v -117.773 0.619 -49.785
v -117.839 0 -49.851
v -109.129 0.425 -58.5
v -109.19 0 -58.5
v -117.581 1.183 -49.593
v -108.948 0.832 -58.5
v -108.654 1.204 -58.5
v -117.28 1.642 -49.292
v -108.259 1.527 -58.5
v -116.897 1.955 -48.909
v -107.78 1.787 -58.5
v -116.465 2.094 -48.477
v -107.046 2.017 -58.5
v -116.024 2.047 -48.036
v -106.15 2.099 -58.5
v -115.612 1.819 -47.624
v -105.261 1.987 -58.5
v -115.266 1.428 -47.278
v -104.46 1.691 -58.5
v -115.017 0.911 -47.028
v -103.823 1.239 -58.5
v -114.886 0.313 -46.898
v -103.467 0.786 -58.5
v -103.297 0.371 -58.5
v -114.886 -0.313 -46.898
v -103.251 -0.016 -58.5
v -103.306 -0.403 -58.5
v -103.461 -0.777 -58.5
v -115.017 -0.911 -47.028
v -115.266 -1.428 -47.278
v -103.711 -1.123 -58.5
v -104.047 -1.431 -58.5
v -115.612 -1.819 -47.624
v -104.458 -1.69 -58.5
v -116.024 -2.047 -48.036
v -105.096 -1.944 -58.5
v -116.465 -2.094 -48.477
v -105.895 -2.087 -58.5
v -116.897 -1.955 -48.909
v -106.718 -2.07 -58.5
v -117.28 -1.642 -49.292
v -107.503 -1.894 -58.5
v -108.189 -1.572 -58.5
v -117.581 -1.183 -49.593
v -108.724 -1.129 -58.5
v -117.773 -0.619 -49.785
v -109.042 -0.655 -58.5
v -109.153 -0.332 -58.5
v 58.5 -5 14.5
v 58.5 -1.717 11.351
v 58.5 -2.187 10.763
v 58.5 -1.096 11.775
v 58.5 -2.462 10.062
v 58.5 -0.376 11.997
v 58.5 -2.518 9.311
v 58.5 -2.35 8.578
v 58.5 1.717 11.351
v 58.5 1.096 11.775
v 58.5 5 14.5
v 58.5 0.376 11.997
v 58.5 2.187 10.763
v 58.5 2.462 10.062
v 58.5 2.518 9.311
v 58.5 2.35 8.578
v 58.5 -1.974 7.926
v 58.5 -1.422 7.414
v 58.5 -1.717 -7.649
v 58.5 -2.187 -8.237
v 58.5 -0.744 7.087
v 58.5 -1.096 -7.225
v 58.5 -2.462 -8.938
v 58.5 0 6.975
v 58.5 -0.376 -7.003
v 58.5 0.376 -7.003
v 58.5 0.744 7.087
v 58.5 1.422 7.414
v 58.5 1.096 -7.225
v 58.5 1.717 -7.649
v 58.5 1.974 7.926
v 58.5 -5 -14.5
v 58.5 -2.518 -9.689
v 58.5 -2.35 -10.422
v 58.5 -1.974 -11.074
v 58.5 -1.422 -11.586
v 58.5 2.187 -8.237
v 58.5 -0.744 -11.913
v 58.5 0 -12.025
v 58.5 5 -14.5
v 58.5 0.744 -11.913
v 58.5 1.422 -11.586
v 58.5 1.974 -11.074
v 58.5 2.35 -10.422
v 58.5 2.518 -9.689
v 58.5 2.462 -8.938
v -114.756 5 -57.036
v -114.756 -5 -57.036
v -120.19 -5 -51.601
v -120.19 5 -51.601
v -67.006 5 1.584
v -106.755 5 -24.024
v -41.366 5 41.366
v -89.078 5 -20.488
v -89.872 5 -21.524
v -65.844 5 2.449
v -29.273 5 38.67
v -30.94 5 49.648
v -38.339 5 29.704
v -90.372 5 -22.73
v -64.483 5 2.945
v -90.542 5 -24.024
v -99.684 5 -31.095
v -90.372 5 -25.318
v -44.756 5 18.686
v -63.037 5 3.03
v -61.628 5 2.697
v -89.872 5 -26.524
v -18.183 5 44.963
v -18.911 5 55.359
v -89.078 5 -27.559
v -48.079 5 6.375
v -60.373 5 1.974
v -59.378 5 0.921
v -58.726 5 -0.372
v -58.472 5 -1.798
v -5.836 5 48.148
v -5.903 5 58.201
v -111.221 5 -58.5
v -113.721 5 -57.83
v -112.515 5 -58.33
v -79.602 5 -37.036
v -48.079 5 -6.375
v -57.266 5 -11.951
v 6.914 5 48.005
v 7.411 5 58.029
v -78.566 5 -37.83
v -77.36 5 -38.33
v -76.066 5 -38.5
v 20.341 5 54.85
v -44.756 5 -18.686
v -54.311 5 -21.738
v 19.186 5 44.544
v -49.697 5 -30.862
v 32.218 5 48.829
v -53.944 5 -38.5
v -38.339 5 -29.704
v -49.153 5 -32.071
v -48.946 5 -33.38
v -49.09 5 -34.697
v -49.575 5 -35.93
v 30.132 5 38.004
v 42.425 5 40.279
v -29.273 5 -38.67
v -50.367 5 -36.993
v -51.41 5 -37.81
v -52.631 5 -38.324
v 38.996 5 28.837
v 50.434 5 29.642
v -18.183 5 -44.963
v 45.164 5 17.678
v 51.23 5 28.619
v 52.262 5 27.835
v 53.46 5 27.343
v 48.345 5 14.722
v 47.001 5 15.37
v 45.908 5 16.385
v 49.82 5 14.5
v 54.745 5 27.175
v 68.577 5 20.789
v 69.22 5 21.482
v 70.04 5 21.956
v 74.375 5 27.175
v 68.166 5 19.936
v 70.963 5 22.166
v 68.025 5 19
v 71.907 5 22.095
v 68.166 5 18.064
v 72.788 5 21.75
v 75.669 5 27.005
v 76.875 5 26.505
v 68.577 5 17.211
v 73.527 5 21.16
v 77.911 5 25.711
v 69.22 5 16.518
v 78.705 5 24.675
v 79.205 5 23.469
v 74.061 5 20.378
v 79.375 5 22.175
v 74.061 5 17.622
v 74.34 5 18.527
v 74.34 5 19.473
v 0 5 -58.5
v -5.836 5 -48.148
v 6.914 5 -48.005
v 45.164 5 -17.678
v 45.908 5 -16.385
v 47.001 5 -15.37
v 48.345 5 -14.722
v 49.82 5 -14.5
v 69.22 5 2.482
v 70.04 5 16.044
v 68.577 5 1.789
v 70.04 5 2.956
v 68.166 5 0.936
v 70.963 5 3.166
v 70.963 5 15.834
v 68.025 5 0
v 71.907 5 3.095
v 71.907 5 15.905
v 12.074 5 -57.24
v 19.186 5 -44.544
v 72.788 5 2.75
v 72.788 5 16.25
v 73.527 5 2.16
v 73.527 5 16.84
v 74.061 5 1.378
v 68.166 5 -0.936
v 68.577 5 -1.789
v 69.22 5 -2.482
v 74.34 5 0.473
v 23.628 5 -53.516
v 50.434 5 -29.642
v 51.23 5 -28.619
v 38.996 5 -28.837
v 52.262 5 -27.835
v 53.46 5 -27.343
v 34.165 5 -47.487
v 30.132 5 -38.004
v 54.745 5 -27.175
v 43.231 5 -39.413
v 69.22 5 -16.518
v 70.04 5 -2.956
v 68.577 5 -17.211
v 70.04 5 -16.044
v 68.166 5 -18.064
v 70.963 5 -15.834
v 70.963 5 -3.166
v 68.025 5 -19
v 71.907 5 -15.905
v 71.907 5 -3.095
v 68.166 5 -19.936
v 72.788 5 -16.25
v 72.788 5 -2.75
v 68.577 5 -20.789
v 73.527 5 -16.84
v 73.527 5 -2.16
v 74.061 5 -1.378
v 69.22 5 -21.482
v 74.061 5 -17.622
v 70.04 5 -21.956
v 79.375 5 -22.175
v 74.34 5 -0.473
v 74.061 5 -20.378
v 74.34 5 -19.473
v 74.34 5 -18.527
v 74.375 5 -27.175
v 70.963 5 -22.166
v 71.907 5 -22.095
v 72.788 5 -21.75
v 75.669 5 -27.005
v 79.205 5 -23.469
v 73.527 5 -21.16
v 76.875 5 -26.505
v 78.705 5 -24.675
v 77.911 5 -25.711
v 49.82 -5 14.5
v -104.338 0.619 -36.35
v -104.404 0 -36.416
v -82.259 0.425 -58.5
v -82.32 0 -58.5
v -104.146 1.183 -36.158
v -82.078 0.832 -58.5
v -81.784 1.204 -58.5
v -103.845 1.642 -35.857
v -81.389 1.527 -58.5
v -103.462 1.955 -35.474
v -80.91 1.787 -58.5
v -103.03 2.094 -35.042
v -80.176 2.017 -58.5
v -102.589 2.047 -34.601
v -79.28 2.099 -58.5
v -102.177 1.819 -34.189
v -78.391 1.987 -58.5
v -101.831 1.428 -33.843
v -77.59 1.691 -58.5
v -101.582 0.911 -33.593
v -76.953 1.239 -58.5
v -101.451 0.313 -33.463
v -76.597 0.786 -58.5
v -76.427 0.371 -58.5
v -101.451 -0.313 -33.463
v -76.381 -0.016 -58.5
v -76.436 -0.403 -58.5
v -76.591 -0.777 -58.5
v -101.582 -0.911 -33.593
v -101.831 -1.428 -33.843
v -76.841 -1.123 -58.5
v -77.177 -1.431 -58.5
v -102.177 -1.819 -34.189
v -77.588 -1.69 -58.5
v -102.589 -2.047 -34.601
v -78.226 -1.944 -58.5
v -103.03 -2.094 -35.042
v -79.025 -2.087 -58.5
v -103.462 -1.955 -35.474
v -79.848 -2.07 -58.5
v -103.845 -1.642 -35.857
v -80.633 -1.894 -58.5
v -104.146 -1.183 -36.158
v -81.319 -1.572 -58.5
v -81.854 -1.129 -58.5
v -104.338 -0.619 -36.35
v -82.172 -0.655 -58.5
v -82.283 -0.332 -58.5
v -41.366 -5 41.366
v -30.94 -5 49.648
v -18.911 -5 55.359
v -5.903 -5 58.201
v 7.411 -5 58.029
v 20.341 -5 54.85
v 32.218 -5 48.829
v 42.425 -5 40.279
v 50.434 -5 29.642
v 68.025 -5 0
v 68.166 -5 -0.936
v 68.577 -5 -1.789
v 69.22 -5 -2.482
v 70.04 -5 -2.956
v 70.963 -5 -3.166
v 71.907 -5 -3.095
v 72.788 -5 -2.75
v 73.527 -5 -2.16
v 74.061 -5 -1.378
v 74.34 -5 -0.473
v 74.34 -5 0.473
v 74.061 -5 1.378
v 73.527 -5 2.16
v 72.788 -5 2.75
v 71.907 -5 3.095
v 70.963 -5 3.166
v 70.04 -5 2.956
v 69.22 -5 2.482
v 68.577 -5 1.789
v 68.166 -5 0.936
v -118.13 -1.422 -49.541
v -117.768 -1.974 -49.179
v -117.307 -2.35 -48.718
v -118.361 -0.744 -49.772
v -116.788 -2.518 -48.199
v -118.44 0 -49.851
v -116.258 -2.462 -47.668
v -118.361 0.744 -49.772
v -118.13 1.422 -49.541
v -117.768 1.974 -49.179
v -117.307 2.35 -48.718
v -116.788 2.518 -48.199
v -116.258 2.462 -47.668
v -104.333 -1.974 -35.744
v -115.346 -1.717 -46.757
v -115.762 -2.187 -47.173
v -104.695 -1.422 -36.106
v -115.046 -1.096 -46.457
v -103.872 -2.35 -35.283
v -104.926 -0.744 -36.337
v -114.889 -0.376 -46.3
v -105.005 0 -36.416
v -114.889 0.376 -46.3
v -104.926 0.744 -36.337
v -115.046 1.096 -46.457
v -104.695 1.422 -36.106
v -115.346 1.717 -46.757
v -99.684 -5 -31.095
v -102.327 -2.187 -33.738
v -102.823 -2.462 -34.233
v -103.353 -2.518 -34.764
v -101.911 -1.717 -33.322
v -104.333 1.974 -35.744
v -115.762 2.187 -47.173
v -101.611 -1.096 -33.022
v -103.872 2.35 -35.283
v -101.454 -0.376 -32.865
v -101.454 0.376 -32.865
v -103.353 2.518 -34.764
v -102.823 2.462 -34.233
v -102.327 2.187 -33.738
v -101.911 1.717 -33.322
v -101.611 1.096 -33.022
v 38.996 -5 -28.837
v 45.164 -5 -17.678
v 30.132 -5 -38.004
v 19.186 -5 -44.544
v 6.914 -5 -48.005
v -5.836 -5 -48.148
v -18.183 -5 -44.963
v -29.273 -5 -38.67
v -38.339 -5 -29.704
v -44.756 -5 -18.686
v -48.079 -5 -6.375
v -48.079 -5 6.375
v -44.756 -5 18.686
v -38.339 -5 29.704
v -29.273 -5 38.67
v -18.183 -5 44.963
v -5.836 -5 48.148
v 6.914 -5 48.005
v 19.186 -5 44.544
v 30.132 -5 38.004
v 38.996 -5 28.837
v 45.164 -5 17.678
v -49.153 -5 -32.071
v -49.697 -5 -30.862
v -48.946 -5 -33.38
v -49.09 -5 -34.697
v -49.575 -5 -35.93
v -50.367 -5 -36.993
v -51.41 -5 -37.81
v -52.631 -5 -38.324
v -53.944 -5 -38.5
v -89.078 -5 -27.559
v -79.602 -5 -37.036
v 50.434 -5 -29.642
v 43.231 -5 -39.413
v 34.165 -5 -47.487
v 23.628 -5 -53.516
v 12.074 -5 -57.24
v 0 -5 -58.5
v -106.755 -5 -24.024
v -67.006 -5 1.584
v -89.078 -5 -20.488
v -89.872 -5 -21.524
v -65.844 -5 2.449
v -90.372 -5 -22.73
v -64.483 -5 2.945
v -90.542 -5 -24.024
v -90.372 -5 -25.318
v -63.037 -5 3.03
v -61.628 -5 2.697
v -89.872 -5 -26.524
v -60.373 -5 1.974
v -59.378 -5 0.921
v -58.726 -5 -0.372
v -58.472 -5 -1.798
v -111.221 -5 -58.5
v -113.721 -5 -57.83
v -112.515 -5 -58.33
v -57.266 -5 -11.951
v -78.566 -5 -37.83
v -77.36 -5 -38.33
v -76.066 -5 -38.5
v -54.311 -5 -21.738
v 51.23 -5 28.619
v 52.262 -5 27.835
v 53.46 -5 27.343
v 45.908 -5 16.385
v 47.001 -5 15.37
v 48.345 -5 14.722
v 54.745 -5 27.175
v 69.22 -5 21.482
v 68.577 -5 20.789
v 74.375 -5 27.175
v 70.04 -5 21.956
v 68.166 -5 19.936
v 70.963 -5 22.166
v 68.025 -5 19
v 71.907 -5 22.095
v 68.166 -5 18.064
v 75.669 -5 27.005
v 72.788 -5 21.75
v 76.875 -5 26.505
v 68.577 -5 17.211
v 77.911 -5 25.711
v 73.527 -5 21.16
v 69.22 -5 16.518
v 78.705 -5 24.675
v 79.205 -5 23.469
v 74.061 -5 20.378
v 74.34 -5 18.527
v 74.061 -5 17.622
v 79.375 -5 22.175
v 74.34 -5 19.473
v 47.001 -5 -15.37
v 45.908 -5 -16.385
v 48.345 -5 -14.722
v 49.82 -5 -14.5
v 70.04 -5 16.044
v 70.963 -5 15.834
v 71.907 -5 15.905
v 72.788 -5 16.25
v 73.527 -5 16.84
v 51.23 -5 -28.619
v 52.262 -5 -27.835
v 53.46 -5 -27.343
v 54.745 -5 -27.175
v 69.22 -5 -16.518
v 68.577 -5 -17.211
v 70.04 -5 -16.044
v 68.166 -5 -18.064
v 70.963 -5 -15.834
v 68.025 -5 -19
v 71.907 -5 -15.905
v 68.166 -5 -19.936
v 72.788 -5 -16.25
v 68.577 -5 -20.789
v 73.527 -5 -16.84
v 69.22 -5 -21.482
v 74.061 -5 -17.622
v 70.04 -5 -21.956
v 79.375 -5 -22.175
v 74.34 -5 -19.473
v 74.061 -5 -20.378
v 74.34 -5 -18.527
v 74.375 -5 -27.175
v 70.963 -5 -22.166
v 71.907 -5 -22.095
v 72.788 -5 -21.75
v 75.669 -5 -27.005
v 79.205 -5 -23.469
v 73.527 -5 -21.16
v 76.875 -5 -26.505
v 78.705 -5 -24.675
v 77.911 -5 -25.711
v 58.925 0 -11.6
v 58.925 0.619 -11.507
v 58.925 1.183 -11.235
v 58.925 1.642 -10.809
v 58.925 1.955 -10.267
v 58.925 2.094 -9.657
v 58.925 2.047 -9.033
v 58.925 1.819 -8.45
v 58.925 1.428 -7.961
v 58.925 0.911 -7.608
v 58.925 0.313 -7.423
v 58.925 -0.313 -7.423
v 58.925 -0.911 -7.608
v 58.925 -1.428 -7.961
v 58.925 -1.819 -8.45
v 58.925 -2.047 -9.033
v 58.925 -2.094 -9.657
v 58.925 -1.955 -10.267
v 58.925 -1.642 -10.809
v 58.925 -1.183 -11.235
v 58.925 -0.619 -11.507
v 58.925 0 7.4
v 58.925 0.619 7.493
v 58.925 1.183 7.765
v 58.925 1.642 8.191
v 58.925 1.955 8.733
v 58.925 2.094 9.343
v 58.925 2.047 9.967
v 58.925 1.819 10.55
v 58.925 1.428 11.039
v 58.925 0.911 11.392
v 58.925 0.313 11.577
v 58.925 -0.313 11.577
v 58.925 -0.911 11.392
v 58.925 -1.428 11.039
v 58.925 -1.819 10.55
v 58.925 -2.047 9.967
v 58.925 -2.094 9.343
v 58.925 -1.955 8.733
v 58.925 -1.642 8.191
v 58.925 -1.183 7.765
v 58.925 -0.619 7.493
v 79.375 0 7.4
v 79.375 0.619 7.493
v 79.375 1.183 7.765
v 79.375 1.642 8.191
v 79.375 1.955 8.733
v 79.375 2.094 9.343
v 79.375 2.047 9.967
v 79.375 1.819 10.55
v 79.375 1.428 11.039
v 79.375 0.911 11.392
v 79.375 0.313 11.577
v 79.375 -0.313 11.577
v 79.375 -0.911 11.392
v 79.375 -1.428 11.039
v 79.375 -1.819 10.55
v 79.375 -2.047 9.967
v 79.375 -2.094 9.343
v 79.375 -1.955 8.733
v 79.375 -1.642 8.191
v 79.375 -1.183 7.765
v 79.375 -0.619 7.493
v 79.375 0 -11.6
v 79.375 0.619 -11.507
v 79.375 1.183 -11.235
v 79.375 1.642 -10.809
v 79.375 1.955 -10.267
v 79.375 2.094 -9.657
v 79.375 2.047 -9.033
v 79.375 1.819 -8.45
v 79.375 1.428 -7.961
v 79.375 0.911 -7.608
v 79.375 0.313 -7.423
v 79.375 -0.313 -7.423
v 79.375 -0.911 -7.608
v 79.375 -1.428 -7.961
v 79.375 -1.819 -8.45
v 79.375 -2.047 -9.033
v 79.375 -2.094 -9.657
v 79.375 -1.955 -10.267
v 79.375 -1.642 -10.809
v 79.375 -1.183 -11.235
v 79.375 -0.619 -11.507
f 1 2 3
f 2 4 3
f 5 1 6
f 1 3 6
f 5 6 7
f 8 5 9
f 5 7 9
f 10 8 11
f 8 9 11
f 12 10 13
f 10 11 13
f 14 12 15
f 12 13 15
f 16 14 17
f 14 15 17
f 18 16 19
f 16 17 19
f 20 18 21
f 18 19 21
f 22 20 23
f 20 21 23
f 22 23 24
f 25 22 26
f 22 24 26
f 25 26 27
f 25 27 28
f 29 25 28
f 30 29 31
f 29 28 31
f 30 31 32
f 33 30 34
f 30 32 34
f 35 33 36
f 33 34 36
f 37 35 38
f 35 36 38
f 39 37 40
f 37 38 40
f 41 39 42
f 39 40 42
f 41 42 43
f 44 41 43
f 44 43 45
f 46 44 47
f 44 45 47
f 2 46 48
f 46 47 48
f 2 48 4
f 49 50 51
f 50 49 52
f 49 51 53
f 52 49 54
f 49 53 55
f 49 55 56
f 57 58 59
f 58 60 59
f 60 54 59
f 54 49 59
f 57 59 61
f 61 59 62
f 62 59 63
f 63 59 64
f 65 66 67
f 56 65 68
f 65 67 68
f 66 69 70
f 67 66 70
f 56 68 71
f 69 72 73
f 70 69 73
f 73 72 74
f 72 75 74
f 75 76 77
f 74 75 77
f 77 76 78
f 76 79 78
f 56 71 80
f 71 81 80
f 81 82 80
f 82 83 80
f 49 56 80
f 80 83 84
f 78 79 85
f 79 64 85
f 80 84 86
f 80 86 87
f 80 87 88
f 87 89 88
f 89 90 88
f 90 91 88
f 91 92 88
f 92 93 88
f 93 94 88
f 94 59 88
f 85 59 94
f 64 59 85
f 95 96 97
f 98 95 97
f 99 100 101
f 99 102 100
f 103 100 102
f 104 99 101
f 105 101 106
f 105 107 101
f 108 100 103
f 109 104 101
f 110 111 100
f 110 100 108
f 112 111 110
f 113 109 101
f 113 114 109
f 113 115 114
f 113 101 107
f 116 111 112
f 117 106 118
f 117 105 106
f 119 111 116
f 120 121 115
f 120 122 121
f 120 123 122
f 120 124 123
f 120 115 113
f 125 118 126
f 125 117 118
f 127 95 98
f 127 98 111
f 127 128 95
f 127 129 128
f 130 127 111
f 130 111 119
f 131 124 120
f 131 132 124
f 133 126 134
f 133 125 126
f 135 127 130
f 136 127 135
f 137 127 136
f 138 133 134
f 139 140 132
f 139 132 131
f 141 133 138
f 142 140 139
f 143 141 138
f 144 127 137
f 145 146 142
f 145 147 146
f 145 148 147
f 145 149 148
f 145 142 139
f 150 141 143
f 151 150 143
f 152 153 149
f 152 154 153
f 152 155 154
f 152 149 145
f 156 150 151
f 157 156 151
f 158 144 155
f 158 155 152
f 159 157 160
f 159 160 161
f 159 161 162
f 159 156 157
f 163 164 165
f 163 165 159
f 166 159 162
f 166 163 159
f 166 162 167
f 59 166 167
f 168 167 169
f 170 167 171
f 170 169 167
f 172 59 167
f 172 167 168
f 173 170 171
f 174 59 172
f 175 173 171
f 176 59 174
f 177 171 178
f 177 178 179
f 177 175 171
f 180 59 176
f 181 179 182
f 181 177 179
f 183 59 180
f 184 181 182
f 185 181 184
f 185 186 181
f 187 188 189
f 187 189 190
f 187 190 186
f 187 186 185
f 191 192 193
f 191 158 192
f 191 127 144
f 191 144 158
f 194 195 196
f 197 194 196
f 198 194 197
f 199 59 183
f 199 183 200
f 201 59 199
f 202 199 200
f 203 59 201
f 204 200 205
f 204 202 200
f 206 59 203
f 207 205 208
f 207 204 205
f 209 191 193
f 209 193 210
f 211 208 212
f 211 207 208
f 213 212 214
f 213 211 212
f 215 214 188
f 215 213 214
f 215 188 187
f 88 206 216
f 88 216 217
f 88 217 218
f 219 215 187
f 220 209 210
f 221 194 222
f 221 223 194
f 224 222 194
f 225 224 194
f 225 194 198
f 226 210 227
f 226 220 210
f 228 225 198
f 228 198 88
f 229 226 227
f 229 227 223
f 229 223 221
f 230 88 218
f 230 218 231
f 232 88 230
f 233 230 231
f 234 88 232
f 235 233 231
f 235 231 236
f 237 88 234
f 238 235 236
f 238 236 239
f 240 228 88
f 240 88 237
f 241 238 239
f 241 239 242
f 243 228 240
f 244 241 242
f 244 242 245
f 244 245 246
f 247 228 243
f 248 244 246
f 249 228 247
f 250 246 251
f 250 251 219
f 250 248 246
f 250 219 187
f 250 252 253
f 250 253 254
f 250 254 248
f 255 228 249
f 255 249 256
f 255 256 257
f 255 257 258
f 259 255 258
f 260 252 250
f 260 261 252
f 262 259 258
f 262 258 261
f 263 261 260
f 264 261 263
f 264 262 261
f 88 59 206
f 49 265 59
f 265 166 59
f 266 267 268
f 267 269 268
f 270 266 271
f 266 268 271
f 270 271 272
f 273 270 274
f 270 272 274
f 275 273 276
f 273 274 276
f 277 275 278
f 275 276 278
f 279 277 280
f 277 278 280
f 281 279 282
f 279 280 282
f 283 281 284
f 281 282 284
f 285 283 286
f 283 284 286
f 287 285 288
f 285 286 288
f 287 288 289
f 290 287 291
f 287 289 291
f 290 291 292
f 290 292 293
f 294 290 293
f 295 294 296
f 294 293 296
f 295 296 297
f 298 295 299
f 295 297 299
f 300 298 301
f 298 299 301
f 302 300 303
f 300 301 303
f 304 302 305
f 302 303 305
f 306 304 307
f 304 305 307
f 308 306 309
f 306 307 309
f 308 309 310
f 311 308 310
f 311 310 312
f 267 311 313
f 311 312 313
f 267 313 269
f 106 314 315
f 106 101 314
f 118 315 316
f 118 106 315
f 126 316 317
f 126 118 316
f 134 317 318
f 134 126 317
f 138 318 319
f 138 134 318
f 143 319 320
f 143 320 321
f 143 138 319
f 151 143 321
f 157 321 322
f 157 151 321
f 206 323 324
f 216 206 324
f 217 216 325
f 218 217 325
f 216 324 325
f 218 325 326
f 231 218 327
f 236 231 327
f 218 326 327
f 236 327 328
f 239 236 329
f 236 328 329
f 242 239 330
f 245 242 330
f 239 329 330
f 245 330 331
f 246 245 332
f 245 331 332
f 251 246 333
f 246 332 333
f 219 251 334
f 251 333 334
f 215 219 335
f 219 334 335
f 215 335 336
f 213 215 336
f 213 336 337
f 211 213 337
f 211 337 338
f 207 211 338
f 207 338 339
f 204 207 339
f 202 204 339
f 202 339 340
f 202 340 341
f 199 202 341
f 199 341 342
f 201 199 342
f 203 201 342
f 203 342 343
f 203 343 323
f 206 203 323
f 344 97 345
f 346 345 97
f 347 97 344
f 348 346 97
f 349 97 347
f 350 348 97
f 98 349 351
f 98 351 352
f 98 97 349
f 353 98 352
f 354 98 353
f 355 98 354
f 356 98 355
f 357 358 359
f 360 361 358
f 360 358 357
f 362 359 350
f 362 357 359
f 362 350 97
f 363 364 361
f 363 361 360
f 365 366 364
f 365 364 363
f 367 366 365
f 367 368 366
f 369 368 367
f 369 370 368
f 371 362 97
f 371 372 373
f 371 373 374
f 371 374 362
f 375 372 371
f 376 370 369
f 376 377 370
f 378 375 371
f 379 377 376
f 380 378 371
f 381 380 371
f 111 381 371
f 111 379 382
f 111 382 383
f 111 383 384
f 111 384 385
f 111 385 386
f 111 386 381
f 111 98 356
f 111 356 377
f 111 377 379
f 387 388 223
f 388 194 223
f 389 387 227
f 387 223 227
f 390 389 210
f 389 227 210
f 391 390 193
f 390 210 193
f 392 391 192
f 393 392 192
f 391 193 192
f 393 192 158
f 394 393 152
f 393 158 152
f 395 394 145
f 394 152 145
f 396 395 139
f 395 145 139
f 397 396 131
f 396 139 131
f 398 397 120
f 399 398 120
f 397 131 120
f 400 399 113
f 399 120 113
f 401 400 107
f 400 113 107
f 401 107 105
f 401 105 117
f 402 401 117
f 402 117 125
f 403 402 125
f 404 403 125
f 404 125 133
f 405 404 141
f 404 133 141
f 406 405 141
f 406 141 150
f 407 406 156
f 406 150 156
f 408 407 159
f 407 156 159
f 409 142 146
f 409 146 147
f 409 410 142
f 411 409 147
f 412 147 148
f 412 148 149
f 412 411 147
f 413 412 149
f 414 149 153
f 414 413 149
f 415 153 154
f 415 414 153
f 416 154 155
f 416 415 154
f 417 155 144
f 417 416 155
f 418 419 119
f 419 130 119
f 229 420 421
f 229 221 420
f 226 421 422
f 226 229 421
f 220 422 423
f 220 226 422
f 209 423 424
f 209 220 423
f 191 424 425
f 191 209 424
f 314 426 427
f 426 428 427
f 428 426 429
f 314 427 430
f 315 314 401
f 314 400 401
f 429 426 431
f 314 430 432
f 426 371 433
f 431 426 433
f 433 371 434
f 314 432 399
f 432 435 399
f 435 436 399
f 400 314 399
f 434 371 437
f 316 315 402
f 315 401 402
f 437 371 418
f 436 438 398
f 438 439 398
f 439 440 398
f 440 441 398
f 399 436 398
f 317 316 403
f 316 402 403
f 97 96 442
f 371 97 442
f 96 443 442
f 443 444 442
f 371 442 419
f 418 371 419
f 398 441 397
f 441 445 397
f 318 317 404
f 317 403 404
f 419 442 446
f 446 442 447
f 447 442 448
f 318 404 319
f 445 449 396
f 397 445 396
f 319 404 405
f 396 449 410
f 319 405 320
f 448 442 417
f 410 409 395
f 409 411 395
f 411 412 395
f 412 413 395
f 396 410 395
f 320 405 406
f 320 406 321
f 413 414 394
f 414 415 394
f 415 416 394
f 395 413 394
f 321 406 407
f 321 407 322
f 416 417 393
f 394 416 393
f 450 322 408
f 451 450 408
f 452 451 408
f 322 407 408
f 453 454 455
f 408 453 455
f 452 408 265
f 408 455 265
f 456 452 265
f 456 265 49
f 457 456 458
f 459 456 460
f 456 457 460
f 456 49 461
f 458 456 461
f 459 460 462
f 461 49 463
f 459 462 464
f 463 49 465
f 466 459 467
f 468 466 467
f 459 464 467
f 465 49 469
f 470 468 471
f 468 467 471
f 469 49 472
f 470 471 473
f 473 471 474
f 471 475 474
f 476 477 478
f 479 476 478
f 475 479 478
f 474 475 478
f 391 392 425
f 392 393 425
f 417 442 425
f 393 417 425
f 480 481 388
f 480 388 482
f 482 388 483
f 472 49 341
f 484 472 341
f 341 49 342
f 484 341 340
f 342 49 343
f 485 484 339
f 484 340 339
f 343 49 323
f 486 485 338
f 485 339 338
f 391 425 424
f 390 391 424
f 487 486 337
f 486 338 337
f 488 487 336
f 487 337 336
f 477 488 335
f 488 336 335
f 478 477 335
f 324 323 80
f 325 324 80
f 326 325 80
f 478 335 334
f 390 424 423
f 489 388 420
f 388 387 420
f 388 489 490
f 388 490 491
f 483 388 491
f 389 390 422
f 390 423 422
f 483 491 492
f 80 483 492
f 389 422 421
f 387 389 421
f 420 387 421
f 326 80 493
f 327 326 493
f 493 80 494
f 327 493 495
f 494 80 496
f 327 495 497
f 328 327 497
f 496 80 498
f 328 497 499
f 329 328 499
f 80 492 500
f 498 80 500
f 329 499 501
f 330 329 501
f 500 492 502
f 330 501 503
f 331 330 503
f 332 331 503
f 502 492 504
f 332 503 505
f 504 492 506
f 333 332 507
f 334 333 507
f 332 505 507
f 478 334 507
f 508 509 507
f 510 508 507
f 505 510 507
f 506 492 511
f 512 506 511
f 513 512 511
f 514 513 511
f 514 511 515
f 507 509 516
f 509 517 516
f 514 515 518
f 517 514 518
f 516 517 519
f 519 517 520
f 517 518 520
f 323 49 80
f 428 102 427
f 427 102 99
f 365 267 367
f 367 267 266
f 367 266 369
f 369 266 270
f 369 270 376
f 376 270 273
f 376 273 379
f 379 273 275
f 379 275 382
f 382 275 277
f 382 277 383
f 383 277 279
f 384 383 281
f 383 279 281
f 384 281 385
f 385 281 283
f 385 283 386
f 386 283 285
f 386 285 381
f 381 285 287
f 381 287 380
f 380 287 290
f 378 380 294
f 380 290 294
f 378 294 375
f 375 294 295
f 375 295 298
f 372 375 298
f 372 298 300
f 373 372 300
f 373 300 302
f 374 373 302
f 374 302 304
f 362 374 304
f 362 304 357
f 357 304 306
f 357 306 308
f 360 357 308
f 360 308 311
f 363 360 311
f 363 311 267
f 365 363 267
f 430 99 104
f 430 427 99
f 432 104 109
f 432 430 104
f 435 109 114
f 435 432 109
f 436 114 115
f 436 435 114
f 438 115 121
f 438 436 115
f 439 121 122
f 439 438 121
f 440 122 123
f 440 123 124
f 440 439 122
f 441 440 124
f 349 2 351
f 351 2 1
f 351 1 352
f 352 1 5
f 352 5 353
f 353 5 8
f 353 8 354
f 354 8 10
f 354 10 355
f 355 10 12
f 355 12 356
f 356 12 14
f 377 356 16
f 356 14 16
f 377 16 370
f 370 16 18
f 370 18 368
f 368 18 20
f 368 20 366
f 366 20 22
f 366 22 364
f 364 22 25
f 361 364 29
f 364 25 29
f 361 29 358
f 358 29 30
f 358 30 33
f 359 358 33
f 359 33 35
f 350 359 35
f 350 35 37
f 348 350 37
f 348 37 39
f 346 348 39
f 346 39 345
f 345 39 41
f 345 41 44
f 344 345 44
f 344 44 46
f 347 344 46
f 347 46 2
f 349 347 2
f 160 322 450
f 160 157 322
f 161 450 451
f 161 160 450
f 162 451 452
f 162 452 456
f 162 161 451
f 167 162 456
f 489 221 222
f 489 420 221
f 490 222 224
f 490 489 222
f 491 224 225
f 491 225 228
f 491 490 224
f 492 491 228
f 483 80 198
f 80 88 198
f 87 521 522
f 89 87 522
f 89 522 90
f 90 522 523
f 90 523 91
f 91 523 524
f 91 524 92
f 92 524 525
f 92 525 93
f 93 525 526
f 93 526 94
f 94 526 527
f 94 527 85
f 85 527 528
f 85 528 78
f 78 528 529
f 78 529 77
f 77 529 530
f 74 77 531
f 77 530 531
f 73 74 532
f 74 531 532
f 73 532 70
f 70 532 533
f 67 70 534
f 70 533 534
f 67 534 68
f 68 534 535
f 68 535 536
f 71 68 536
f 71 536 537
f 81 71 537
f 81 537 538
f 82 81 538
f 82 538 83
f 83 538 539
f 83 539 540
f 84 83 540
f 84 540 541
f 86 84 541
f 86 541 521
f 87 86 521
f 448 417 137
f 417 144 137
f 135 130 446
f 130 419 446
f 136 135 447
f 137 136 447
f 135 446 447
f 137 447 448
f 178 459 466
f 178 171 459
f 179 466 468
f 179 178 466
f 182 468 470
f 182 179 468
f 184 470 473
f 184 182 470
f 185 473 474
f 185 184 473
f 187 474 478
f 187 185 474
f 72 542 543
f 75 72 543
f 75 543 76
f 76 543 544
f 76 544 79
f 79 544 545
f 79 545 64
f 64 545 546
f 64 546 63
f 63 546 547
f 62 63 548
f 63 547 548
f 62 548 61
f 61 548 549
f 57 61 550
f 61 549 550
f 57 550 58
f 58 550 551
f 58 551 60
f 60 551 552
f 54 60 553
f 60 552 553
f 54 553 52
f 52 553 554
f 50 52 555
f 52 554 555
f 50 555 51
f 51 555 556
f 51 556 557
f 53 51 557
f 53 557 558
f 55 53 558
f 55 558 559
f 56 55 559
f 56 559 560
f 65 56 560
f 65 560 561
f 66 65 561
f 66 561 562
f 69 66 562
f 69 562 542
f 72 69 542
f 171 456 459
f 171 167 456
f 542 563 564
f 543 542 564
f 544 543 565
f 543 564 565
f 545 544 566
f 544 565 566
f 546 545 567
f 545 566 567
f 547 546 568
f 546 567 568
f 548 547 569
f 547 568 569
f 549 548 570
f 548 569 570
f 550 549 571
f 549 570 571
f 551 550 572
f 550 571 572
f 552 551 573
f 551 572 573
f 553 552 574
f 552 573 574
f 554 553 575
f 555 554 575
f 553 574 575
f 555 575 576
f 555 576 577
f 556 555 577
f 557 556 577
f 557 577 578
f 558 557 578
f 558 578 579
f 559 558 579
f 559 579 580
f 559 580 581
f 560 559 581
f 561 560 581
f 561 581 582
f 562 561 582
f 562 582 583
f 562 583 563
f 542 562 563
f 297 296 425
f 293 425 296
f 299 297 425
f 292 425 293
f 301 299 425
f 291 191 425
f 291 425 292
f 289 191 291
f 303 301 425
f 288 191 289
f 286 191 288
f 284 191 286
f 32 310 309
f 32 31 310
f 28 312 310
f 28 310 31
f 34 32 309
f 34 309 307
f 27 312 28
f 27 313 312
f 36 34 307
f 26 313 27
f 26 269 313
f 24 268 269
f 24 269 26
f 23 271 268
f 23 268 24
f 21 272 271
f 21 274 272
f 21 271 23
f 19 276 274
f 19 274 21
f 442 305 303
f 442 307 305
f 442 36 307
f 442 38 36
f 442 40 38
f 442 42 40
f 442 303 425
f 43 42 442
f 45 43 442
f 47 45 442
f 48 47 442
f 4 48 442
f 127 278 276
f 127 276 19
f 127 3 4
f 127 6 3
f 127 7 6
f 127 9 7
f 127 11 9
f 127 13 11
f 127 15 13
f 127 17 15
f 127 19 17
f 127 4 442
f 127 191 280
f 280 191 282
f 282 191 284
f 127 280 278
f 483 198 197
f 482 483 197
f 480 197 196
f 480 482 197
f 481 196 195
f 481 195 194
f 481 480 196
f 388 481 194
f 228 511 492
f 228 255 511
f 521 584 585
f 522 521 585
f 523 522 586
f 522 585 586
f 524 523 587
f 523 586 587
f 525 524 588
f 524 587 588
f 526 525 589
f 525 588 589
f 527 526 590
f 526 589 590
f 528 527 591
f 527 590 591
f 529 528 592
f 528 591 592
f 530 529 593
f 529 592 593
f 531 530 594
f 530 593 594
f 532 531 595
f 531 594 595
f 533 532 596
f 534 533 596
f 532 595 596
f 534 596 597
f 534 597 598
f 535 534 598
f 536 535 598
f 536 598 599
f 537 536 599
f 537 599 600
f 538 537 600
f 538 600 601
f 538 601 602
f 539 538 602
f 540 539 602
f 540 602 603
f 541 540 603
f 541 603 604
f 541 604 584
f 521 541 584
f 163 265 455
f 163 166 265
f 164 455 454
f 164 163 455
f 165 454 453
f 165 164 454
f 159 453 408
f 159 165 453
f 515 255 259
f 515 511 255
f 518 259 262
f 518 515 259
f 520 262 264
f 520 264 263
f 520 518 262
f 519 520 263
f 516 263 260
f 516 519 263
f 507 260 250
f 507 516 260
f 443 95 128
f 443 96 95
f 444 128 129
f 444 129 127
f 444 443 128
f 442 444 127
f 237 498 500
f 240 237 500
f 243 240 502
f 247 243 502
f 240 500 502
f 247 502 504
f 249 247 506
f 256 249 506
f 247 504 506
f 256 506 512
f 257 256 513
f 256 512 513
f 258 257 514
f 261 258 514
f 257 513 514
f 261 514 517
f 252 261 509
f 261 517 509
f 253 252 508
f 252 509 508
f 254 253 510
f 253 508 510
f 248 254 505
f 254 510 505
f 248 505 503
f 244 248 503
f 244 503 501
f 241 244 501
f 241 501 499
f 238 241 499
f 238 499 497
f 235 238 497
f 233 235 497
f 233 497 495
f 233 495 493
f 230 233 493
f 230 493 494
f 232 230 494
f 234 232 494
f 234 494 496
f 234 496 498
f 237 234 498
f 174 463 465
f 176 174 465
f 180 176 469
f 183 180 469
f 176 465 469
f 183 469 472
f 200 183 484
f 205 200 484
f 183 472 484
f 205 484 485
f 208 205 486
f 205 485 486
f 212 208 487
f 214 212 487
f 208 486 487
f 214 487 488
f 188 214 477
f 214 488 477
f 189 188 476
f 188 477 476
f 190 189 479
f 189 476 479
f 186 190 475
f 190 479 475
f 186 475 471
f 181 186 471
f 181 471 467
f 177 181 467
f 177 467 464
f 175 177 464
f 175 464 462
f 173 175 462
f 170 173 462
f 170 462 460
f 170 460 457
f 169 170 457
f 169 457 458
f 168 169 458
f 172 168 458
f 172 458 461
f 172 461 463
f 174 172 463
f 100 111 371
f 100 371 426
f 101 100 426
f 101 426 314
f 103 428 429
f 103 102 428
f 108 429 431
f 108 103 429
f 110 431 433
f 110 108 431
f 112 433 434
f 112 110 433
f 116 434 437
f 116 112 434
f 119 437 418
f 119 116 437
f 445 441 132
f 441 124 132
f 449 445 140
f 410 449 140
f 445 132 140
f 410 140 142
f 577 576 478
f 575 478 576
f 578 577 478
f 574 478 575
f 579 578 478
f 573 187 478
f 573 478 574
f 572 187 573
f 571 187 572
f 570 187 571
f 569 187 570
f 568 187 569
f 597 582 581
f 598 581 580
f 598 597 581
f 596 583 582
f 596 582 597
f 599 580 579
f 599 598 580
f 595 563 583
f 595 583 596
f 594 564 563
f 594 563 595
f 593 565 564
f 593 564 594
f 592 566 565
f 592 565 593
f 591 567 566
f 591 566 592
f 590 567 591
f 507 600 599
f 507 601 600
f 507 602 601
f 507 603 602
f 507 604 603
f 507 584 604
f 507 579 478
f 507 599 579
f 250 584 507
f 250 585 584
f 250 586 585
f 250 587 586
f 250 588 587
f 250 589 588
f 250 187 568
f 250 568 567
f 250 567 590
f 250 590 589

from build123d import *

# Parameters (mm, degrees)
BOSS_EXTRUDE1_DEPTH             = 5
M5X0_8_TAPPED_HOLE1_D           = 4.2
M5X0_8_TAPPED_HOLE1_DEPTH       = 40
M5X0_8_TAPPED_HOLE1_CSINK_D     = 5.05
M5X0_8_TAPPED_HOLE1_CSINK_ANGLE = 90
M5X0_8_TAPPED_HOLE1_TIP         = 1.2618073
M5X0_8_TAPPED_HOLE2_D           = 4.2
M5X0_8_TAPPED_HOLE2_DEPTH       = 20.875
M5X0_8_TAPPED_HOLE2_CSINK_D     = 5.05
M5X0_8_TAPPED_HOLE2_CSINK_ANGLE = 90
F_1_4_0_25_DIAMETER_HOLE1_D     = 6.35
FILLET1_R                       = 5


with BuildPart() as part:
    # Sketch1 → Boss-Extrude1 (new body, symmetric)
    with BuildSketch(Plane(origin=(0, 0, 0), x_dir=(1, 0, 0), z_dir=(0, 1, 0))):
        with BuildLine():
            Line((-120.190475132, 51.601117357), (-99.684378478, 31.095020703))
            Line((-99.684378478, 31.095020703), (-106.75544629, 24.023952891))
            Line((-106.75544629, 24.023952891), (-41.365746699, -41.365746699))
            ThreePointArc((-41.365746699, -41.365746699), (8.808484383, -57.833040754), (51.805109545, -27.175))
            Line((51.805109545, -27.175), (79.375, -27.175))
            Line((79.375, -27.175), (79.375, 27.175))
            Line((79.375, 27.175), (51.805109545, 27.175))
            ThreePointArc((51.805109545, 27.175), (30.269724974, 50.059901618), (0, 58.5))
            Line((0, 58.5), (-113.291592489, 58.5))
            Line((-113.291592489, 58.5), (-120.190475132, 51.601117357))
        make_face()
        with BuildLine():
            Line((58.5, -14.5), (58.5, 14.5))
            Line((58.5, 14.5), (46.281745862, 14.5))
            ThreePointArc((46.281745862, 14.5), (-48.5, 0), (46.281745862, -14.5))
            Line((46.281745862, -14.5), (58.5, -14.5))
        make_face(mode=Mode.SUBTRACT)
        with BuildLine():
            Line((-92.613310666, 24.023952891), (-57.4247459, -11.164611875))
            ThreePointArc((-57.4247459, -11.164611875), (-56.48621622, 15.217009469), (-44.045431091, 38.5))
            Line((-44.045431091, 38.5), (-78.137263557, 38.5))
            Line((-78.137263557, 38.5), (-92.613310666, 24.023952891))
        make_face(mode=Mode.SUBTRACT)
    extrude(amount=BOSS_EXTRUDE1_DEPTH, both=True)

    # M5x0.8 Tapped Hole1
    with Locations(Plane(origin=(-34.294678888, 0, 34.294678888), x_dir=(0.707106781, 0, 0.707106781), z_dir=(-0.707106781, 0, 0.707106781))):
        with Locations((-116.475, 0), (-97.475, 0)):
            CounterSinkHole(M5X0_8_TAPPED_HOLE1_D / 2, M5X0_8_TAPPED_HOLE1_CSINK_D / 2, depth=M5X0_8_TAPPED_HOLE1_DEPTH, counter_sink_angle=M5X0_8_TAPPED_HOLE1_CSINK_ANGLE)
            with Locations((0, 0, -(M5X0_8_TAPPED_HOLE1_DEPTH + M5X0_8_TAPPED_HOLE1_TIP / 2))):  # 118° drill point
                Cone(0, M5X0_8_TAPPED_HOLE1_D / 2, M5X0_8_TAPPED_HOLE1_TIP, mode=Mode.SUBTRACT)

    # M5x0.8 Tapped Hole2
    with Locations(Plane.ZY.offset(-58.5)):
        with Locations((-9.5, 0), (9.5, 0)):
            CounterSinkHole(M5X0_8_TAPPED_HOLE2_D / 2, M5X0_8_TAPPED_HOLE2_CSINK_D / 2, depth=M5X0_8_TAPPED_HOLE2_DEPTH, counter_sink_angle=M5X0_8_TAPPED_HOLE2_CSINK_ANGLE)

    # 1/4 (0.25) Diameter Hole1 (through all)
    with Locations(Plane(origin=(0, 5, 0), x_dir=(1, 0, 0), z_dir=(0, 1, 0))):
        with Locations((71.2, 19), (71.2, 0), (71.2, -19)):
            Hole(F_1_4_0_25_DIAMETER_HOLE1_D / 2)

    # Fillet1
    fillet1_edges = [part.edges().sort_by_distance(p)[0] for p in [
        (-113.291592489, 0, -58.5),
        (51.805109545, 0, -27.175),
        (79.375, 0, -27.175),
        (79.375, 0, 27.175),
        (51.805109545, 0, 27.175),
        (46.281745862, 0, 14.5),
        (46.281745862, 0, -14.5),
        (-92.613310666, 0, -24.023952891),
        (-78.137263557, 0, -38.5),
        (-44.045431091, 0, -38.5),
        (-57.4247459, 0, 11.164611875),
    ]]
    fillet(fillet1_edges, radius=FILLET1_R)


solid = part.part
